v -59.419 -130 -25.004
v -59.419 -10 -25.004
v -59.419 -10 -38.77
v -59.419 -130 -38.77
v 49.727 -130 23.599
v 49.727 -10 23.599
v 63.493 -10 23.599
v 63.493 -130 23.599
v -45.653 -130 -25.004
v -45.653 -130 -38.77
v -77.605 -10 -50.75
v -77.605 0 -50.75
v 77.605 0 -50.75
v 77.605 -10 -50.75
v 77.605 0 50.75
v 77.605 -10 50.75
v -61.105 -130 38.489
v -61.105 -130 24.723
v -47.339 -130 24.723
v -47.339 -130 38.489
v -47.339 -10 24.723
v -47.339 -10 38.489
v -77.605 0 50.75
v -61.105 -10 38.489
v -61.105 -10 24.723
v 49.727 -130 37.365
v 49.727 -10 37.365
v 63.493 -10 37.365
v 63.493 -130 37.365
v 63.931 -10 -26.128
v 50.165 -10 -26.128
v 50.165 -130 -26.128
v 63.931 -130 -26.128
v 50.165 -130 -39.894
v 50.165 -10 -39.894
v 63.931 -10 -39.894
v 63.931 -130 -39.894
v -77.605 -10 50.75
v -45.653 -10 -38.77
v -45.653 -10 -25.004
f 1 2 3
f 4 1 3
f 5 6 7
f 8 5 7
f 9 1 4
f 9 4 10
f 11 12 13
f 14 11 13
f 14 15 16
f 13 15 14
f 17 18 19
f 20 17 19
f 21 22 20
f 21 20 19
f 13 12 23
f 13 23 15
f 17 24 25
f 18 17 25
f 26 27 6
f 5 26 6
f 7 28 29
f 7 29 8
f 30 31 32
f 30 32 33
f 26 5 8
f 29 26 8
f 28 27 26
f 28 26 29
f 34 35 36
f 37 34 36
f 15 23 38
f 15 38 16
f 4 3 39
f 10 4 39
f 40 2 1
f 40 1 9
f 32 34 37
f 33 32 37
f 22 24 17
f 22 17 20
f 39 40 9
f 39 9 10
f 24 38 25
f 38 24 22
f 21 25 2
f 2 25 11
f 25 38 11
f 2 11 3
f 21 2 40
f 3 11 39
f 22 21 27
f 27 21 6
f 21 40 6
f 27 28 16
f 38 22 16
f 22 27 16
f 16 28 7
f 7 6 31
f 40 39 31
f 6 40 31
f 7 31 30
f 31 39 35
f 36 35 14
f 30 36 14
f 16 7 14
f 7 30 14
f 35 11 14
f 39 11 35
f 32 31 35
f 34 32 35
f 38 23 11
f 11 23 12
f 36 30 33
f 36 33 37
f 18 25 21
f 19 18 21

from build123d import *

# Parameters (mm, degrees)
SKETCH1_W           = 155.20995072
SKETCH1_H           = 101.500935516
BOSS_EXTRUDE1_DEPTH = 10
SKETCH2_W           = 13.766131438
SKETCH2_H           = 13.766131439
SKETCH2_H_2         = 13.766131438
SKETCH2_W_2         = 13.766131439
BOSS_EXTRUDE2_DEPTH = 130


with BuildPart() as part:
    # Sketch1 → Boss-Extrude1 (new body)
    with BuildSketch(Plane(origin=(0, 0, 0), x_dir=(1, 0, 0), z_dir=(0, 1, 0))):
        Rectangle(SKETCH1_W, SKETCH1_H)
    extrude(amount=-BOSS_EXTRUDE1_DEPTH)

    # Sketch2 → Boss-Extrude2 (add)
    with BuildSketch(Plane(origin=(0, 0, 0), x_dir=(1, 0, 0), z_dir=(0, 1, 0))):
        with Locations((57.048171322, 33.010928537)):
            Rectangle(SKETCH2_W, SKETCH2_H)
        with Locations((-52.536052633, 31.886855475)):
            Rectangle(SKETCH2_W, SKETCH2_H_2)
        with Locations((-54.221701381, -31.605914017)):
            Rectangle(SKETCH2_W_2, SKETCH2_H_2)
        with Locations((56.609703773, -30.482148186)):
            Rectangle(SKETCH2_W, SKETCH2_H)
    extrude(amount=-BOSS_EXTRUDE2_DEPTH)


solid = part.part
